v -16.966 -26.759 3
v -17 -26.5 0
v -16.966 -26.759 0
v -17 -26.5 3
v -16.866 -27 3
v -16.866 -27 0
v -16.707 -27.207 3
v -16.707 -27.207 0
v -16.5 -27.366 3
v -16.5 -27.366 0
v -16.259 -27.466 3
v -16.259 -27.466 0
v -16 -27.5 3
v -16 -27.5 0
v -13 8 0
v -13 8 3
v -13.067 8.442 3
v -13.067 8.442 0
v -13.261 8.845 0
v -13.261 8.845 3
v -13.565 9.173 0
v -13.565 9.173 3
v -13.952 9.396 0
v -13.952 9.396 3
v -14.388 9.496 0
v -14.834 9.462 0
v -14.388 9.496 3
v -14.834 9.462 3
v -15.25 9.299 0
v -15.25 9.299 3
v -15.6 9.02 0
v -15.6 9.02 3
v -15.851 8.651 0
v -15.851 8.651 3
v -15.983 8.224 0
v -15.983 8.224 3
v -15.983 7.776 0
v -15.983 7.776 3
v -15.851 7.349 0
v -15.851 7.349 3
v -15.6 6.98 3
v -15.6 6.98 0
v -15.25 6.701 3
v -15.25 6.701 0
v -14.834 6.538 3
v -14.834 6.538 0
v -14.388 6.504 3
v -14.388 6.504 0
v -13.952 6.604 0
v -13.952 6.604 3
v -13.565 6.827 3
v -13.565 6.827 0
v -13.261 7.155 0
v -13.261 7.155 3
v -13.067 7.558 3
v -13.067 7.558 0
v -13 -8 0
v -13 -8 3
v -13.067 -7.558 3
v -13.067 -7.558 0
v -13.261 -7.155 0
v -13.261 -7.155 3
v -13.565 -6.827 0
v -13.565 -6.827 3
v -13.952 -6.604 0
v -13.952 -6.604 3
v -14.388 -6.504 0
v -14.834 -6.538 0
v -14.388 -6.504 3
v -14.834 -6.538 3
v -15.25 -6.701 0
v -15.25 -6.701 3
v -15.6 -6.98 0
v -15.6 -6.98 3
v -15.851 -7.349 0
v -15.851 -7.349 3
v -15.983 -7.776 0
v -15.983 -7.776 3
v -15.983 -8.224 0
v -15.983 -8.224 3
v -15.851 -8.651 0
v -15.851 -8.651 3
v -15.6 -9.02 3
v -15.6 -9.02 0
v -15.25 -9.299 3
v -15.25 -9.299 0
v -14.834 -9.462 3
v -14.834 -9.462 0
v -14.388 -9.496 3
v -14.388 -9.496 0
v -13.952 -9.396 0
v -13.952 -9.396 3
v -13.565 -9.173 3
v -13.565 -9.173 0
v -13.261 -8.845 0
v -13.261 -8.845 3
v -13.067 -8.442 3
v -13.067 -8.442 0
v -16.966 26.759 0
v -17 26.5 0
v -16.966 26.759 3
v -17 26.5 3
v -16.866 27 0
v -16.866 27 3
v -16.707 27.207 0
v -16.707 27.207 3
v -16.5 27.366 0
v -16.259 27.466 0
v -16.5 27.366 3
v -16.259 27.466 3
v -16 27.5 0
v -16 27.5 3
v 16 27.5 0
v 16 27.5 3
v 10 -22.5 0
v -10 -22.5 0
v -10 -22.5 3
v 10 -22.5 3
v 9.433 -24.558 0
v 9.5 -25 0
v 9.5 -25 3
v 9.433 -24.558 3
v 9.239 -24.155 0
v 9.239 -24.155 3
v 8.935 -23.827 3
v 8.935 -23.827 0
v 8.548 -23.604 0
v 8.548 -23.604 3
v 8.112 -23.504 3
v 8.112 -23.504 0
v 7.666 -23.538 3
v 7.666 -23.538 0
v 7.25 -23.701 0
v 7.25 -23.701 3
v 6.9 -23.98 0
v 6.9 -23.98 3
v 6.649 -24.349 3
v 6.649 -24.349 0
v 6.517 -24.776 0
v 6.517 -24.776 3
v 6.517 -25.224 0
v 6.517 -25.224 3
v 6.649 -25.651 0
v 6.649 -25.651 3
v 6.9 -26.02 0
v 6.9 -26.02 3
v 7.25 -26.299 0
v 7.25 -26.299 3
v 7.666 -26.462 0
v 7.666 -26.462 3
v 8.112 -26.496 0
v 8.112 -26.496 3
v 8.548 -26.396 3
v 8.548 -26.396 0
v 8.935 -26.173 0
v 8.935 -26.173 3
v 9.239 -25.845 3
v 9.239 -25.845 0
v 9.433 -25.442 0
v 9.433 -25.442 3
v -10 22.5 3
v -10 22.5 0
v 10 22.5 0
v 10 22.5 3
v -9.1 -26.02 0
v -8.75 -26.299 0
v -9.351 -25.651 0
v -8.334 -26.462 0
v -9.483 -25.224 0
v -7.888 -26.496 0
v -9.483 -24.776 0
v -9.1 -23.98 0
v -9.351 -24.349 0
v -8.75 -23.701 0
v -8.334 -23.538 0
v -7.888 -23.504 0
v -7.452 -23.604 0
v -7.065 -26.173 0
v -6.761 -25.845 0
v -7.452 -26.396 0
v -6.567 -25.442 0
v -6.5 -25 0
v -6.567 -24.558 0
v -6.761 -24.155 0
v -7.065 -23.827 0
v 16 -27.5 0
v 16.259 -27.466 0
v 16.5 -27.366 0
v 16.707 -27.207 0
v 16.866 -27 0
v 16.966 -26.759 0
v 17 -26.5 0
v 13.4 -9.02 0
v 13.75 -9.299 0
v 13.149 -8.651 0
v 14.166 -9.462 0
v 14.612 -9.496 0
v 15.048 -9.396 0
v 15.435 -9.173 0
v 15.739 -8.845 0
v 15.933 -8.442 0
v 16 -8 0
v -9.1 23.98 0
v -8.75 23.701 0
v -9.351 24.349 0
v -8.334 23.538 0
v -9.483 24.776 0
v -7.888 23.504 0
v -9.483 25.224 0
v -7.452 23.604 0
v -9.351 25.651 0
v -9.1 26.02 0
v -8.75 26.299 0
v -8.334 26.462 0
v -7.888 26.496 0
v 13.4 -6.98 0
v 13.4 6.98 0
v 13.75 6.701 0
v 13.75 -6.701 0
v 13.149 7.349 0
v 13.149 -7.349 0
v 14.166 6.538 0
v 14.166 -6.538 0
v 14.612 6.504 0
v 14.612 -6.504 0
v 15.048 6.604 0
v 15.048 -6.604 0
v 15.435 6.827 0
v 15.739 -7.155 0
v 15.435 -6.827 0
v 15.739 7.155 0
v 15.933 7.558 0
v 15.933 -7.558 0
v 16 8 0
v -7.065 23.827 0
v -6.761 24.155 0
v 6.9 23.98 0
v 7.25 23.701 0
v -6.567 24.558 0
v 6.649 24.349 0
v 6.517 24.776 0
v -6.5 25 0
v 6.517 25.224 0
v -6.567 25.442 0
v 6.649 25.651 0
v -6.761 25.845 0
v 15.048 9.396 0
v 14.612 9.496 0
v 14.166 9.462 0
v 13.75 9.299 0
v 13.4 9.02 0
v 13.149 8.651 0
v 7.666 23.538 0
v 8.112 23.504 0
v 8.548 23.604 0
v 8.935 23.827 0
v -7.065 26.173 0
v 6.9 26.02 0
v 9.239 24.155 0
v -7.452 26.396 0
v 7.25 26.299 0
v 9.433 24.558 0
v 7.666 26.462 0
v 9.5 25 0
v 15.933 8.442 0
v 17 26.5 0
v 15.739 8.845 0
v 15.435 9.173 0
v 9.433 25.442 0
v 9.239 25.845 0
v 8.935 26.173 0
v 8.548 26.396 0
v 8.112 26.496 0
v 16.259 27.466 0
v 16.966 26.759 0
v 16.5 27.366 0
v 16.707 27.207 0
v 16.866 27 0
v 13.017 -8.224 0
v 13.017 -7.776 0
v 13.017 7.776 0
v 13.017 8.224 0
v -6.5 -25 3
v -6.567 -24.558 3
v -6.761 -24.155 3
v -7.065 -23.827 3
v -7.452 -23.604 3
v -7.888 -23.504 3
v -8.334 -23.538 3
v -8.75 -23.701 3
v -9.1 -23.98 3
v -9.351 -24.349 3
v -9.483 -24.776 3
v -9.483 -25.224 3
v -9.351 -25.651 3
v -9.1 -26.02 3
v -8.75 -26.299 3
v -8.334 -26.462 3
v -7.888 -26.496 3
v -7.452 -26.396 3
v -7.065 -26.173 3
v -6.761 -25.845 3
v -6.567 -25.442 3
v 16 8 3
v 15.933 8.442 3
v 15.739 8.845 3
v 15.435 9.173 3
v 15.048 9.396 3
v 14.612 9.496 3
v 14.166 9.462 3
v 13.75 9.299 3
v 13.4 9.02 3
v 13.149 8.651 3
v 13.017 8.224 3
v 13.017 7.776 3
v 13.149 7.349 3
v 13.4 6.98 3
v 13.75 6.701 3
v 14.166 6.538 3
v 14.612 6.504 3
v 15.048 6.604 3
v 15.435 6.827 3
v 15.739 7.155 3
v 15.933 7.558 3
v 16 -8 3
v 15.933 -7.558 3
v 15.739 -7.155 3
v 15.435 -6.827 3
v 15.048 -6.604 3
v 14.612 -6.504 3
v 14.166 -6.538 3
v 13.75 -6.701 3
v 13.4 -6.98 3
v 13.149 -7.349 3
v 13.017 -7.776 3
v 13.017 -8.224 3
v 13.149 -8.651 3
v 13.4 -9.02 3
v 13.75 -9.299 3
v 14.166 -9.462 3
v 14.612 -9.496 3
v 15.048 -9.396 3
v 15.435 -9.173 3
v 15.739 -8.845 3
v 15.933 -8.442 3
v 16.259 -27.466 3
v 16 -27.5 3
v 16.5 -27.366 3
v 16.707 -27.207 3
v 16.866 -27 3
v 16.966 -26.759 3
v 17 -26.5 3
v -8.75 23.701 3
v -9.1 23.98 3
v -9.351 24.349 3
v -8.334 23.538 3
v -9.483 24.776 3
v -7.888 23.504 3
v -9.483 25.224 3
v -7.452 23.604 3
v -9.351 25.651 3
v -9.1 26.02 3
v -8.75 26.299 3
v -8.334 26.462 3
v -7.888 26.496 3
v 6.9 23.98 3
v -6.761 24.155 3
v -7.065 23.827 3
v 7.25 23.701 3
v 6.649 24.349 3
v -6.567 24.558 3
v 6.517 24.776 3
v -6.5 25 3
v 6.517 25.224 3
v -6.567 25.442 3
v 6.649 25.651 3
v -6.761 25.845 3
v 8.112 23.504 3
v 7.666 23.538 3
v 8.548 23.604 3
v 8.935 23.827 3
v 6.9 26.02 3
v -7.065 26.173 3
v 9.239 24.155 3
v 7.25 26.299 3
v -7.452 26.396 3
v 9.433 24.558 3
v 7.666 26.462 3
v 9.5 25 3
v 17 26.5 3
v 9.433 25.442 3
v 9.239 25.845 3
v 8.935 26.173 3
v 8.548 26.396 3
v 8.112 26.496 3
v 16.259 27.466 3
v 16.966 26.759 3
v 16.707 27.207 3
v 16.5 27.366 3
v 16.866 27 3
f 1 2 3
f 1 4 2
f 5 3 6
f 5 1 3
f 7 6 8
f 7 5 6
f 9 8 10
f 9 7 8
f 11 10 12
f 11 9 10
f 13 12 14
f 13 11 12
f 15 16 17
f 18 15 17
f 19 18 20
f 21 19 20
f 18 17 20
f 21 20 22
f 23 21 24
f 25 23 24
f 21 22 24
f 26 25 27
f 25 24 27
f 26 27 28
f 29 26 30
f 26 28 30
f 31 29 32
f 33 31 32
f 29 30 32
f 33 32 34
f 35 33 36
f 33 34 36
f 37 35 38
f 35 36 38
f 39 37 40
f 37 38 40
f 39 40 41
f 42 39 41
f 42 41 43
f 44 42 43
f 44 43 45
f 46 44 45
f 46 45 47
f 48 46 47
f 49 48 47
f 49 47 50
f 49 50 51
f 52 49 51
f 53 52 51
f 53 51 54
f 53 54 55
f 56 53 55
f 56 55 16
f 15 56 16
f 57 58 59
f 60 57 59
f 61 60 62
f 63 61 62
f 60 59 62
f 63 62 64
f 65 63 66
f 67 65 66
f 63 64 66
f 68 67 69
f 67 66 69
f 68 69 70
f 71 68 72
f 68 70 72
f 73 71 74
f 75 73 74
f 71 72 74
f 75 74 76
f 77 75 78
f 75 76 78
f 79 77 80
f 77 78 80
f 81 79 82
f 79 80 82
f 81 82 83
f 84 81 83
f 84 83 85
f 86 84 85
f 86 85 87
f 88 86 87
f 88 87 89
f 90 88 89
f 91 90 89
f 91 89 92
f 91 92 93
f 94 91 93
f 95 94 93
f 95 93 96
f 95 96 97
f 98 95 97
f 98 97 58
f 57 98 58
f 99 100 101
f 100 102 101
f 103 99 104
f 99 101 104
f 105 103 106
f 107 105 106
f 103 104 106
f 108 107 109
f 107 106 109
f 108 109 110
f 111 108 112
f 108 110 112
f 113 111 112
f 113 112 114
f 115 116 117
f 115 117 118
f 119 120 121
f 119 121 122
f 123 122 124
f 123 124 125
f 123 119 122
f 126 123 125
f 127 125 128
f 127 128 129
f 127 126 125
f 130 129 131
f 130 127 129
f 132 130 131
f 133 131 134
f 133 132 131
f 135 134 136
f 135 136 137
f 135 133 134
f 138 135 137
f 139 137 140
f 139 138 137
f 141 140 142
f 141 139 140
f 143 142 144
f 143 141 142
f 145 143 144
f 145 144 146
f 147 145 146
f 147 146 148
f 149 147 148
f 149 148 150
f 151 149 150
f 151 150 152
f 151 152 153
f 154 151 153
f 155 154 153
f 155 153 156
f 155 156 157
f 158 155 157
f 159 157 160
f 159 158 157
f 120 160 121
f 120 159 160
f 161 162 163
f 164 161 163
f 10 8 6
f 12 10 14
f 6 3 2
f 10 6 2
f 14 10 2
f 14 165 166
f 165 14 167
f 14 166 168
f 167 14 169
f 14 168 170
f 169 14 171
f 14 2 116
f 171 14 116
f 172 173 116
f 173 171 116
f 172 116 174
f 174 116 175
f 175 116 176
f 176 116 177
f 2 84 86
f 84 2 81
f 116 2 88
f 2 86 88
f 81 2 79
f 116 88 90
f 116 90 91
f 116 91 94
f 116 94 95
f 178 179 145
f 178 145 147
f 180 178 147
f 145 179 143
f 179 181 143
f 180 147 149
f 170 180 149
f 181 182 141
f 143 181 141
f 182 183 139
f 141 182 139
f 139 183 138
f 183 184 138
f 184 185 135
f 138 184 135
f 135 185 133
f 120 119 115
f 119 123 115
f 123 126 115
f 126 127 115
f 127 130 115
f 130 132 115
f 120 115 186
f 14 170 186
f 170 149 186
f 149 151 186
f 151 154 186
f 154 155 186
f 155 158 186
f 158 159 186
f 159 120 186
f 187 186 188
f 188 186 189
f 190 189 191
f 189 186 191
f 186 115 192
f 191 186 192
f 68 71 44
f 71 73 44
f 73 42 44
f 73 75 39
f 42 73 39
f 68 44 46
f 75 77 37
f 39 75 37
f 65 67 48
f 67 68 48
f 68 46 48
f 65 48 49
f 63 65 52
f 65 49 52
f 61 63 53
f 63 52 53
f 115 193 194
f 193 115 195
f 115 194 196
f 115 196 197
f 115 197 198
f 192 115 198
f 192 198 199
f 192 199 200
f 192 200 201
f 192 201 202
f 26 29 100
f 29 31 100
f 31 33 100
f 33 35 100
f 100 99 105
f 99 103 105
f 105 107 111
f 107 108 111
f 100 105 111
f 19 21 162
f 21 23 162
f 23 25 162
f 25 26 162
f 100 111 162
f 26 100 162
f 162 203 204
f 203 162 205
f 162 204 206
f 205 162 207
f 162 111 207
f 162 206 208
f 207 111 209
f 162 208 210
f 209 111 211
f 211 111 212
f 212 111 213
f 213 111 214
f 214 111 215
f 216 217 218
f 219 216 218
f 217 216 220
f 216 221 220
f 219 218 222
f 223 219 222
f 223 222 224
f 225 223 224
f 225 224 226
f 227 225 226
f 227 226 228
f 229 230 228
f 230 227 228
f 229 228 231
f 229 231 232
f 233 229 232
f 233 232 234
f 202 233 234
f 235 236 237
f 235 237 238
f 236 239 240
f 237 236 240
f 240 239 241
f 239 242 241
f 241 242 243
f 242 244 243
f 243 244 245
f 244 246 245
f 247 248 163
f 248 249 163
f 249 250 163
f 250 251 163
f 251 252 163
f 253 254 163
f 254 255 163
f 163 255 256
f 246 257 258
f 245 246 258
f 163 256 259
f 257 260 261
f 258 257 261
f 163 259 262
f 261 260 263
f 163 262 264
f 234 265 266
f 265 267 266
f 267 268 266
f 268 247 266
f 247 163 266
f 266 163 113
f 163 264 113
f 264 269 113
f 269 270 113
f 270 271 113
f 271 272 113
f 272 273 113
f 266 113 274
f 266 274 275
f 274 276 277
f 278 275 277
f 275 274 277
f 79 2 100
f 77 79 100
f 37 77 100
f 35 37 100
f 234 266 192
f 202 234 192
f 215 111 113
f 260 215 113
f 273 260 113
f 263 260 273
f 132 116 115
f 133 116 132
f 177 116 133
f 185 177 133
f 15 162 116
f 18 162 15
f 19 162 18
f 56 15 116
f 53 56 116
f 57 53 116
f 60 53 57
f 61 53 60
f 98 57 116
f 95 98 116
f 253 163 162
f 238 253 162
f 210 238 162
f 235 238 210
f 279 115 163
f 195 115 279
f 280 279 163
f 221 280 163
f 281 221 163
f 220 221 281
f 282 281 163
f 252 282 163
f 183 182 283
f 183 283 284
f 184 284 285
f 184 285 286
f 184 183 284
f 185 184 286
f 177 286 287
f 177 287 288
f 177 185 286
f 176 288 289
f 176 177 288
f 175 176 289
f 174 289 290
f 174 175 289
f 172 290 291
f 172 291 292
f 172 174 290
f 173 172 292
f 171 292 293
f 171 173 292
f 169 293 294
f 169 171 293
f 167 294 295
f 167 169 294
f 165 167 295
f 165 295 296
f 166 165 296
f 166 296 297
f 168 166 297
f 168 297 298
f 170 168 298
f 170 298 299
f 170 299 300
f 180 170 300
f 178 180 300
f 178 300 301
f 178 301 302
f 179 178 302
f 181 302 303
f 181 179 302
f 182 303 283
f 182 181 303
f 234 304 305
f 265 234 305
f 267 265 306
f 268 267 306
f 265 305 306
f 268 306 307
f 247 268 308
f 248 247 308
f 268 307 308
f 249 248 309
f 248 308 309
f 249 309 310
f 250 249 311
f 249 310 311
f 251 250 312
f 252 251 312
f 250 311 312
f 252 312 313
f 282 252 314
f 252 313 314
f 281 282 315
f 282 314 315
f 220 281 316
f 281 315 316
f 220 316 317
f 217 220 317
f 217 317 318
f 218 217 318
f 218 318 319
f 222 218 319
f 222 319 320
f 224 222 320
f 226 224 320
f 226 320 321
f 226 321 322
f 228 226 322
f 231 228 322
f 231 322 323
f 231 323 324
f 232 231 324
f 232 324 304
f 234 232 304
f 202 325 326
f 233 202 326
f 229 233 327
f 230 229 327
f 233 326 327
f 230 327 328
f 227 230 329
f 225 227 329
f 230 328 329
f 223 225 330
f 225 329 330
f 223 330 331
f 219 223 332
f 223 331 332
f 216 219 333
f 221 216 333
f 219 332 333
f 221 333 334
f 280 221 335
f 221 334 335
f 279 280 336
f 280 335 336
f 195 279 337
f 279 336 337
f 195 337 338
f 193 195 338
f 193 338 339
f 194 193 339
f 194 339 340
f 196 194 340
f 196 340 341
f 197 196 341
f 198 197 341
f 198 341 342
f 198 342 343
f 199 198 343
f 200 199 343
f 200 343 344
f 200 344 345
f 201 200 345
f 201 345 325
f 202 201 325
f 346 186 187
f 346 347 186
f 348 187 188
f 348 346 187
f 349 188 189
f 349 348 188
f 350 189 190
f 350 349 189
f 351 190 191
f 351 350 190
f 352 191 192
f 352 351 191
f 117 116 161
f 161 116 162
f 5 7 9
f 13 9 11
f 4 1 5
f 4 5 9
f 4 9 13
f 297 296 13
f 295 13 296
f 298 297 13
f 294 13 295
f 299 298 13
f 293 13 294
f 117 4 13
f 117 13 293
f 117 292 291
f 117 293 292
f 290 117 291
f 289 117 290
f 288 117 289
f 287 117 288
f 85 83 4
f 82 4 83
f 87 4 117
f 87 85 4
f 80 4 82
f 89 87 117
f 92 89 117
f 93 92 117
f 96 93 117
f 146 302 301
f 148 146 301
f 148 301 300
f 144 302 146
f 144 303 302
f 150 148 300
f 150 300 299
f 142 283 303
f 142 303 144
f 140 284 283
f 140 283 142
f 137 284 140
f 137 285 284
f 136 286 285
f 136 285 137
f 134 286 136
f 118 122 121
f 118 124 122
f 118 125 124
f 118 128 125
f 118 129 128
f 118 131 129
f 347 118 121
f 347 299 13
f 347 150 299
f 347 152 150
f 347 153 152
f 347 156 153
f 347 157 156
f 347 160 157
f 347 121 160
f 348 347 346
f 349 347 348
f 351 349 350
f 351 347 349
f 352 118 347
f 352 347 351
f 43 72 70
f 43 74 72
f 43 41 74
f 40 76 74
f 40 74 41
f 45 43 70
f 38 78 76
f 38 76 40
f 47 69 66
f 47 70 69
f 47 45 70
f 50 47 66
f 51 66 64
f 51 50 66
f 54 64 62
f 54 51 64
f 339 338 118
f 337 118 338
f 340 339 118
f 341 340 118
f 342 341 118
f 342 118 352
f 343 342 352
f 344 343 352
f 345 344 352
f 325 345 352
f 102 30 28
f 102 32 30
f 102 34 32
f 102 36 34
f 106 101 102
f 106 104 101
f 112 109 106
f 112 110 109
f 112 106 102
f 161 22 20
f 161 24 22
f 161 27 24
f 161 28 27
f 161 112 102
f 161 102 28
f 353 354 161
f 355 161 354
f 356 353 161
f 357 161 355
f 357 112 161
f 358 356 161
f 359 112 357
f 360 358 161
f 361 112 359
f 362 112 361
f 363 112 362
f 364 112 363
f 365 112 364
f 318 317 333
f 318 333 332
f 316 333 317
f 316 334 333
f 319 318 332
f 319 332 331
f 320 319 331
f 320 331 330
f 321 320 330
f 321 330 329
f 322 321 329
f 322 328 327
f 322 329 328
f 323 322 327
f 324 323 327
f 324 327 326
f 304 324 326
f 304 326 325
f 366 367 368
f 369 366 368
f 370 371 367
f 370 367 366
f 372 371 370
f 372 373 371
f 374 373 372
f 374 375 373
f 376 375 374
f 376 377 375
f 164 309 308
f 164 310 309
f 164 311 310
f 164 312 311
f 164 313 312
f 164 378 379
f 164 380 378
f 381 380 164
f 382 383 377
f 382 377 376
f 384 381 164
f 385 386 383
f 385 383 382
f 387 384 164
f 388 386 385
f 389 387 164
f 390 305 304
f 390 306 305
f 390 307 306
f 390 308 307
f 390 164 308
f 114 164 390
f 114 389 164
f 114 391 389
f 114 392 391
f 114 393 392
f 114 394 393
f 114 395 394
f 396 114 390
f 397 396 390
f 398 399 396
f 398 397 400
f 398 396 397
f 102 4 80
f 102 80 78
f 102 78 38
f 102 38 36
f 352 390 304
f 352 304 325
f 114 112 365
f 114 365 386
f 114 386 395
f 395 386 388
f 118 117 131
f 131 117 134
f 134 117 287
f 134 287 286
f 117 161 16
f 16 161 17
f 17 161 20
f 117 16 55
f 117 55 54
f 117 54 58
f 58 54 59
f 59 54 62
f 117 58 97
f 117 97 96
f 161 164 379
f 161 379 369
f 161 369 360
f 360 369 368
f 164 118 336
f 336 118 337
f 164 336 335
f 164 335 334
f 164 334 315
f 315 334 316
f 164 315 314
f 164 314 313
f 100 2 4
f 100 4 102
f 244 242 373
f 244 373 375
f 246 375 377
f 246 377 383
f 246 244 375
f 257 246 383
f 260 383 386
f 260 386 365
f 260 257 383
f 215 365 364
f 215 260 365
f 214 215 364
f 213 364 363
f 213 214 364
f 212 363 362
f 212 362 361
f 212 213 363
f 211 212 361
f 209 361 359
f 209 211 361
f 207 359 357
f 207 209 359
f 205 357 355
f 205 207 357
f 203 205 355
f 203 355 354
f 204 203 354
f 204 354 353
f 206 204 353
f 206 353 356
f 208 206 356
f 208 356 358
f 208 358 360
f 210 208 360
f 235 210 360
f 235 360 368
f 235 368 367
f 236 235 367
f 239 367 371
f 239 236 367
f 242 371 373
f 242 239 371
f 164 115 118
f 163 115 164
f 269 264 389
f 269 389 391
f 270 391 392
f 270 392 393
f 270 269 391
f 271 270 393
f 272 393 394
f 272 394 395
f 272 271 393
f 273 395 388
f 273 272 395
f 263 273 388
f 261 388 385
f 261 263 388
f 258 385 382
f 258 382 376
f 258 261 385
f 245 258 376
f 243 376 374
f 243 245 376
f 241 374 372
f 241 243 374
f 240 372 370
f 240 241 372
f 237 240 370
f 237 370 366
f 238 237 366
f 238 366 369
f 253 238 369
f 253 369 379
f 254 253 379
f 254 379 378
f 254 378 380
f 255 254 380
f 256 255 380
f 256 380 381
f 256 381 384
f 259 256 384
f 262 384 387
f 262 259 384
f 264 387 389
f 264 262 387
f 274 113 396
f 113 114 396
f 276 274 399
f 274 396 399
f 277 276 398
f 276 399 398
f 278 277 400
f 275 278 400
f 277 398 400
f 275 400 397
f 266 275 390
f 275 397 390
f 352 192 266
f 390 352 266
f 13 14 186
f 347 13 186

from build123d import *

# Parameters (mm, degrees)
F0_W     = 34
F0_H     = 55
F0_R     = 1.5
F0_W_2   = 20
F0_H_2   = 45
F1_DEPTH = 3
F2_R     = 1.5
F3_DEPTH = 5
F4_R     = 1


with BuildPart() as f1:
    # F0 (on Top) → F1 (new body)
    with BuildSketch(Plane.XY):
        Rectangle(F0_W, F0_H)
        with Locations((-8, -25)):
            Circle(F0_R, mode=Mode.SUBTRACT)
        with Locations((8, -25)):
            Circle(F0_R, mode=Mode.SUBTRACT)
        with Locations((-8, 25)):
            Circle(F0_R, mode=Mode.SUBTRACT)
        Rectangle(F0_W_2, F0_H_2, mode=Mode.SUBTRACT)
        with Locations((8, 25)):
            Circle(F0_R, mode=Mode.SUBTRACT)
    extrude(amount=F1_DEPTH)

    # F2 (on face) → F3 (cut)
    with BuildSketch(Plane.XY.offset(3)):
        with Locations((-14.5, 8)):
            Circle(F2_R)
        with Locations((14.5, 8)):
            Circle(F2_R)
        with Locations((-14.5, -8)):
            Circle(F2_R)
        with Locations((14.5, -8)):
            Circle(F2_R)
    extrude(amount=-F3_DEPTH, mode=Mode.SUBTRACT)

    # F4
    f4_edges = [f1.edges().sort_by_distance(p)[0] for p in [
        (-17, 27.5, 1.5),
        (17, 27.5, 1.5),
        (17, -27.5, 1.5),
        (-17, -27.5, 1.5),
    ]]
    fillet(f4_edges, radius=F4_R)


solid = f1.part
